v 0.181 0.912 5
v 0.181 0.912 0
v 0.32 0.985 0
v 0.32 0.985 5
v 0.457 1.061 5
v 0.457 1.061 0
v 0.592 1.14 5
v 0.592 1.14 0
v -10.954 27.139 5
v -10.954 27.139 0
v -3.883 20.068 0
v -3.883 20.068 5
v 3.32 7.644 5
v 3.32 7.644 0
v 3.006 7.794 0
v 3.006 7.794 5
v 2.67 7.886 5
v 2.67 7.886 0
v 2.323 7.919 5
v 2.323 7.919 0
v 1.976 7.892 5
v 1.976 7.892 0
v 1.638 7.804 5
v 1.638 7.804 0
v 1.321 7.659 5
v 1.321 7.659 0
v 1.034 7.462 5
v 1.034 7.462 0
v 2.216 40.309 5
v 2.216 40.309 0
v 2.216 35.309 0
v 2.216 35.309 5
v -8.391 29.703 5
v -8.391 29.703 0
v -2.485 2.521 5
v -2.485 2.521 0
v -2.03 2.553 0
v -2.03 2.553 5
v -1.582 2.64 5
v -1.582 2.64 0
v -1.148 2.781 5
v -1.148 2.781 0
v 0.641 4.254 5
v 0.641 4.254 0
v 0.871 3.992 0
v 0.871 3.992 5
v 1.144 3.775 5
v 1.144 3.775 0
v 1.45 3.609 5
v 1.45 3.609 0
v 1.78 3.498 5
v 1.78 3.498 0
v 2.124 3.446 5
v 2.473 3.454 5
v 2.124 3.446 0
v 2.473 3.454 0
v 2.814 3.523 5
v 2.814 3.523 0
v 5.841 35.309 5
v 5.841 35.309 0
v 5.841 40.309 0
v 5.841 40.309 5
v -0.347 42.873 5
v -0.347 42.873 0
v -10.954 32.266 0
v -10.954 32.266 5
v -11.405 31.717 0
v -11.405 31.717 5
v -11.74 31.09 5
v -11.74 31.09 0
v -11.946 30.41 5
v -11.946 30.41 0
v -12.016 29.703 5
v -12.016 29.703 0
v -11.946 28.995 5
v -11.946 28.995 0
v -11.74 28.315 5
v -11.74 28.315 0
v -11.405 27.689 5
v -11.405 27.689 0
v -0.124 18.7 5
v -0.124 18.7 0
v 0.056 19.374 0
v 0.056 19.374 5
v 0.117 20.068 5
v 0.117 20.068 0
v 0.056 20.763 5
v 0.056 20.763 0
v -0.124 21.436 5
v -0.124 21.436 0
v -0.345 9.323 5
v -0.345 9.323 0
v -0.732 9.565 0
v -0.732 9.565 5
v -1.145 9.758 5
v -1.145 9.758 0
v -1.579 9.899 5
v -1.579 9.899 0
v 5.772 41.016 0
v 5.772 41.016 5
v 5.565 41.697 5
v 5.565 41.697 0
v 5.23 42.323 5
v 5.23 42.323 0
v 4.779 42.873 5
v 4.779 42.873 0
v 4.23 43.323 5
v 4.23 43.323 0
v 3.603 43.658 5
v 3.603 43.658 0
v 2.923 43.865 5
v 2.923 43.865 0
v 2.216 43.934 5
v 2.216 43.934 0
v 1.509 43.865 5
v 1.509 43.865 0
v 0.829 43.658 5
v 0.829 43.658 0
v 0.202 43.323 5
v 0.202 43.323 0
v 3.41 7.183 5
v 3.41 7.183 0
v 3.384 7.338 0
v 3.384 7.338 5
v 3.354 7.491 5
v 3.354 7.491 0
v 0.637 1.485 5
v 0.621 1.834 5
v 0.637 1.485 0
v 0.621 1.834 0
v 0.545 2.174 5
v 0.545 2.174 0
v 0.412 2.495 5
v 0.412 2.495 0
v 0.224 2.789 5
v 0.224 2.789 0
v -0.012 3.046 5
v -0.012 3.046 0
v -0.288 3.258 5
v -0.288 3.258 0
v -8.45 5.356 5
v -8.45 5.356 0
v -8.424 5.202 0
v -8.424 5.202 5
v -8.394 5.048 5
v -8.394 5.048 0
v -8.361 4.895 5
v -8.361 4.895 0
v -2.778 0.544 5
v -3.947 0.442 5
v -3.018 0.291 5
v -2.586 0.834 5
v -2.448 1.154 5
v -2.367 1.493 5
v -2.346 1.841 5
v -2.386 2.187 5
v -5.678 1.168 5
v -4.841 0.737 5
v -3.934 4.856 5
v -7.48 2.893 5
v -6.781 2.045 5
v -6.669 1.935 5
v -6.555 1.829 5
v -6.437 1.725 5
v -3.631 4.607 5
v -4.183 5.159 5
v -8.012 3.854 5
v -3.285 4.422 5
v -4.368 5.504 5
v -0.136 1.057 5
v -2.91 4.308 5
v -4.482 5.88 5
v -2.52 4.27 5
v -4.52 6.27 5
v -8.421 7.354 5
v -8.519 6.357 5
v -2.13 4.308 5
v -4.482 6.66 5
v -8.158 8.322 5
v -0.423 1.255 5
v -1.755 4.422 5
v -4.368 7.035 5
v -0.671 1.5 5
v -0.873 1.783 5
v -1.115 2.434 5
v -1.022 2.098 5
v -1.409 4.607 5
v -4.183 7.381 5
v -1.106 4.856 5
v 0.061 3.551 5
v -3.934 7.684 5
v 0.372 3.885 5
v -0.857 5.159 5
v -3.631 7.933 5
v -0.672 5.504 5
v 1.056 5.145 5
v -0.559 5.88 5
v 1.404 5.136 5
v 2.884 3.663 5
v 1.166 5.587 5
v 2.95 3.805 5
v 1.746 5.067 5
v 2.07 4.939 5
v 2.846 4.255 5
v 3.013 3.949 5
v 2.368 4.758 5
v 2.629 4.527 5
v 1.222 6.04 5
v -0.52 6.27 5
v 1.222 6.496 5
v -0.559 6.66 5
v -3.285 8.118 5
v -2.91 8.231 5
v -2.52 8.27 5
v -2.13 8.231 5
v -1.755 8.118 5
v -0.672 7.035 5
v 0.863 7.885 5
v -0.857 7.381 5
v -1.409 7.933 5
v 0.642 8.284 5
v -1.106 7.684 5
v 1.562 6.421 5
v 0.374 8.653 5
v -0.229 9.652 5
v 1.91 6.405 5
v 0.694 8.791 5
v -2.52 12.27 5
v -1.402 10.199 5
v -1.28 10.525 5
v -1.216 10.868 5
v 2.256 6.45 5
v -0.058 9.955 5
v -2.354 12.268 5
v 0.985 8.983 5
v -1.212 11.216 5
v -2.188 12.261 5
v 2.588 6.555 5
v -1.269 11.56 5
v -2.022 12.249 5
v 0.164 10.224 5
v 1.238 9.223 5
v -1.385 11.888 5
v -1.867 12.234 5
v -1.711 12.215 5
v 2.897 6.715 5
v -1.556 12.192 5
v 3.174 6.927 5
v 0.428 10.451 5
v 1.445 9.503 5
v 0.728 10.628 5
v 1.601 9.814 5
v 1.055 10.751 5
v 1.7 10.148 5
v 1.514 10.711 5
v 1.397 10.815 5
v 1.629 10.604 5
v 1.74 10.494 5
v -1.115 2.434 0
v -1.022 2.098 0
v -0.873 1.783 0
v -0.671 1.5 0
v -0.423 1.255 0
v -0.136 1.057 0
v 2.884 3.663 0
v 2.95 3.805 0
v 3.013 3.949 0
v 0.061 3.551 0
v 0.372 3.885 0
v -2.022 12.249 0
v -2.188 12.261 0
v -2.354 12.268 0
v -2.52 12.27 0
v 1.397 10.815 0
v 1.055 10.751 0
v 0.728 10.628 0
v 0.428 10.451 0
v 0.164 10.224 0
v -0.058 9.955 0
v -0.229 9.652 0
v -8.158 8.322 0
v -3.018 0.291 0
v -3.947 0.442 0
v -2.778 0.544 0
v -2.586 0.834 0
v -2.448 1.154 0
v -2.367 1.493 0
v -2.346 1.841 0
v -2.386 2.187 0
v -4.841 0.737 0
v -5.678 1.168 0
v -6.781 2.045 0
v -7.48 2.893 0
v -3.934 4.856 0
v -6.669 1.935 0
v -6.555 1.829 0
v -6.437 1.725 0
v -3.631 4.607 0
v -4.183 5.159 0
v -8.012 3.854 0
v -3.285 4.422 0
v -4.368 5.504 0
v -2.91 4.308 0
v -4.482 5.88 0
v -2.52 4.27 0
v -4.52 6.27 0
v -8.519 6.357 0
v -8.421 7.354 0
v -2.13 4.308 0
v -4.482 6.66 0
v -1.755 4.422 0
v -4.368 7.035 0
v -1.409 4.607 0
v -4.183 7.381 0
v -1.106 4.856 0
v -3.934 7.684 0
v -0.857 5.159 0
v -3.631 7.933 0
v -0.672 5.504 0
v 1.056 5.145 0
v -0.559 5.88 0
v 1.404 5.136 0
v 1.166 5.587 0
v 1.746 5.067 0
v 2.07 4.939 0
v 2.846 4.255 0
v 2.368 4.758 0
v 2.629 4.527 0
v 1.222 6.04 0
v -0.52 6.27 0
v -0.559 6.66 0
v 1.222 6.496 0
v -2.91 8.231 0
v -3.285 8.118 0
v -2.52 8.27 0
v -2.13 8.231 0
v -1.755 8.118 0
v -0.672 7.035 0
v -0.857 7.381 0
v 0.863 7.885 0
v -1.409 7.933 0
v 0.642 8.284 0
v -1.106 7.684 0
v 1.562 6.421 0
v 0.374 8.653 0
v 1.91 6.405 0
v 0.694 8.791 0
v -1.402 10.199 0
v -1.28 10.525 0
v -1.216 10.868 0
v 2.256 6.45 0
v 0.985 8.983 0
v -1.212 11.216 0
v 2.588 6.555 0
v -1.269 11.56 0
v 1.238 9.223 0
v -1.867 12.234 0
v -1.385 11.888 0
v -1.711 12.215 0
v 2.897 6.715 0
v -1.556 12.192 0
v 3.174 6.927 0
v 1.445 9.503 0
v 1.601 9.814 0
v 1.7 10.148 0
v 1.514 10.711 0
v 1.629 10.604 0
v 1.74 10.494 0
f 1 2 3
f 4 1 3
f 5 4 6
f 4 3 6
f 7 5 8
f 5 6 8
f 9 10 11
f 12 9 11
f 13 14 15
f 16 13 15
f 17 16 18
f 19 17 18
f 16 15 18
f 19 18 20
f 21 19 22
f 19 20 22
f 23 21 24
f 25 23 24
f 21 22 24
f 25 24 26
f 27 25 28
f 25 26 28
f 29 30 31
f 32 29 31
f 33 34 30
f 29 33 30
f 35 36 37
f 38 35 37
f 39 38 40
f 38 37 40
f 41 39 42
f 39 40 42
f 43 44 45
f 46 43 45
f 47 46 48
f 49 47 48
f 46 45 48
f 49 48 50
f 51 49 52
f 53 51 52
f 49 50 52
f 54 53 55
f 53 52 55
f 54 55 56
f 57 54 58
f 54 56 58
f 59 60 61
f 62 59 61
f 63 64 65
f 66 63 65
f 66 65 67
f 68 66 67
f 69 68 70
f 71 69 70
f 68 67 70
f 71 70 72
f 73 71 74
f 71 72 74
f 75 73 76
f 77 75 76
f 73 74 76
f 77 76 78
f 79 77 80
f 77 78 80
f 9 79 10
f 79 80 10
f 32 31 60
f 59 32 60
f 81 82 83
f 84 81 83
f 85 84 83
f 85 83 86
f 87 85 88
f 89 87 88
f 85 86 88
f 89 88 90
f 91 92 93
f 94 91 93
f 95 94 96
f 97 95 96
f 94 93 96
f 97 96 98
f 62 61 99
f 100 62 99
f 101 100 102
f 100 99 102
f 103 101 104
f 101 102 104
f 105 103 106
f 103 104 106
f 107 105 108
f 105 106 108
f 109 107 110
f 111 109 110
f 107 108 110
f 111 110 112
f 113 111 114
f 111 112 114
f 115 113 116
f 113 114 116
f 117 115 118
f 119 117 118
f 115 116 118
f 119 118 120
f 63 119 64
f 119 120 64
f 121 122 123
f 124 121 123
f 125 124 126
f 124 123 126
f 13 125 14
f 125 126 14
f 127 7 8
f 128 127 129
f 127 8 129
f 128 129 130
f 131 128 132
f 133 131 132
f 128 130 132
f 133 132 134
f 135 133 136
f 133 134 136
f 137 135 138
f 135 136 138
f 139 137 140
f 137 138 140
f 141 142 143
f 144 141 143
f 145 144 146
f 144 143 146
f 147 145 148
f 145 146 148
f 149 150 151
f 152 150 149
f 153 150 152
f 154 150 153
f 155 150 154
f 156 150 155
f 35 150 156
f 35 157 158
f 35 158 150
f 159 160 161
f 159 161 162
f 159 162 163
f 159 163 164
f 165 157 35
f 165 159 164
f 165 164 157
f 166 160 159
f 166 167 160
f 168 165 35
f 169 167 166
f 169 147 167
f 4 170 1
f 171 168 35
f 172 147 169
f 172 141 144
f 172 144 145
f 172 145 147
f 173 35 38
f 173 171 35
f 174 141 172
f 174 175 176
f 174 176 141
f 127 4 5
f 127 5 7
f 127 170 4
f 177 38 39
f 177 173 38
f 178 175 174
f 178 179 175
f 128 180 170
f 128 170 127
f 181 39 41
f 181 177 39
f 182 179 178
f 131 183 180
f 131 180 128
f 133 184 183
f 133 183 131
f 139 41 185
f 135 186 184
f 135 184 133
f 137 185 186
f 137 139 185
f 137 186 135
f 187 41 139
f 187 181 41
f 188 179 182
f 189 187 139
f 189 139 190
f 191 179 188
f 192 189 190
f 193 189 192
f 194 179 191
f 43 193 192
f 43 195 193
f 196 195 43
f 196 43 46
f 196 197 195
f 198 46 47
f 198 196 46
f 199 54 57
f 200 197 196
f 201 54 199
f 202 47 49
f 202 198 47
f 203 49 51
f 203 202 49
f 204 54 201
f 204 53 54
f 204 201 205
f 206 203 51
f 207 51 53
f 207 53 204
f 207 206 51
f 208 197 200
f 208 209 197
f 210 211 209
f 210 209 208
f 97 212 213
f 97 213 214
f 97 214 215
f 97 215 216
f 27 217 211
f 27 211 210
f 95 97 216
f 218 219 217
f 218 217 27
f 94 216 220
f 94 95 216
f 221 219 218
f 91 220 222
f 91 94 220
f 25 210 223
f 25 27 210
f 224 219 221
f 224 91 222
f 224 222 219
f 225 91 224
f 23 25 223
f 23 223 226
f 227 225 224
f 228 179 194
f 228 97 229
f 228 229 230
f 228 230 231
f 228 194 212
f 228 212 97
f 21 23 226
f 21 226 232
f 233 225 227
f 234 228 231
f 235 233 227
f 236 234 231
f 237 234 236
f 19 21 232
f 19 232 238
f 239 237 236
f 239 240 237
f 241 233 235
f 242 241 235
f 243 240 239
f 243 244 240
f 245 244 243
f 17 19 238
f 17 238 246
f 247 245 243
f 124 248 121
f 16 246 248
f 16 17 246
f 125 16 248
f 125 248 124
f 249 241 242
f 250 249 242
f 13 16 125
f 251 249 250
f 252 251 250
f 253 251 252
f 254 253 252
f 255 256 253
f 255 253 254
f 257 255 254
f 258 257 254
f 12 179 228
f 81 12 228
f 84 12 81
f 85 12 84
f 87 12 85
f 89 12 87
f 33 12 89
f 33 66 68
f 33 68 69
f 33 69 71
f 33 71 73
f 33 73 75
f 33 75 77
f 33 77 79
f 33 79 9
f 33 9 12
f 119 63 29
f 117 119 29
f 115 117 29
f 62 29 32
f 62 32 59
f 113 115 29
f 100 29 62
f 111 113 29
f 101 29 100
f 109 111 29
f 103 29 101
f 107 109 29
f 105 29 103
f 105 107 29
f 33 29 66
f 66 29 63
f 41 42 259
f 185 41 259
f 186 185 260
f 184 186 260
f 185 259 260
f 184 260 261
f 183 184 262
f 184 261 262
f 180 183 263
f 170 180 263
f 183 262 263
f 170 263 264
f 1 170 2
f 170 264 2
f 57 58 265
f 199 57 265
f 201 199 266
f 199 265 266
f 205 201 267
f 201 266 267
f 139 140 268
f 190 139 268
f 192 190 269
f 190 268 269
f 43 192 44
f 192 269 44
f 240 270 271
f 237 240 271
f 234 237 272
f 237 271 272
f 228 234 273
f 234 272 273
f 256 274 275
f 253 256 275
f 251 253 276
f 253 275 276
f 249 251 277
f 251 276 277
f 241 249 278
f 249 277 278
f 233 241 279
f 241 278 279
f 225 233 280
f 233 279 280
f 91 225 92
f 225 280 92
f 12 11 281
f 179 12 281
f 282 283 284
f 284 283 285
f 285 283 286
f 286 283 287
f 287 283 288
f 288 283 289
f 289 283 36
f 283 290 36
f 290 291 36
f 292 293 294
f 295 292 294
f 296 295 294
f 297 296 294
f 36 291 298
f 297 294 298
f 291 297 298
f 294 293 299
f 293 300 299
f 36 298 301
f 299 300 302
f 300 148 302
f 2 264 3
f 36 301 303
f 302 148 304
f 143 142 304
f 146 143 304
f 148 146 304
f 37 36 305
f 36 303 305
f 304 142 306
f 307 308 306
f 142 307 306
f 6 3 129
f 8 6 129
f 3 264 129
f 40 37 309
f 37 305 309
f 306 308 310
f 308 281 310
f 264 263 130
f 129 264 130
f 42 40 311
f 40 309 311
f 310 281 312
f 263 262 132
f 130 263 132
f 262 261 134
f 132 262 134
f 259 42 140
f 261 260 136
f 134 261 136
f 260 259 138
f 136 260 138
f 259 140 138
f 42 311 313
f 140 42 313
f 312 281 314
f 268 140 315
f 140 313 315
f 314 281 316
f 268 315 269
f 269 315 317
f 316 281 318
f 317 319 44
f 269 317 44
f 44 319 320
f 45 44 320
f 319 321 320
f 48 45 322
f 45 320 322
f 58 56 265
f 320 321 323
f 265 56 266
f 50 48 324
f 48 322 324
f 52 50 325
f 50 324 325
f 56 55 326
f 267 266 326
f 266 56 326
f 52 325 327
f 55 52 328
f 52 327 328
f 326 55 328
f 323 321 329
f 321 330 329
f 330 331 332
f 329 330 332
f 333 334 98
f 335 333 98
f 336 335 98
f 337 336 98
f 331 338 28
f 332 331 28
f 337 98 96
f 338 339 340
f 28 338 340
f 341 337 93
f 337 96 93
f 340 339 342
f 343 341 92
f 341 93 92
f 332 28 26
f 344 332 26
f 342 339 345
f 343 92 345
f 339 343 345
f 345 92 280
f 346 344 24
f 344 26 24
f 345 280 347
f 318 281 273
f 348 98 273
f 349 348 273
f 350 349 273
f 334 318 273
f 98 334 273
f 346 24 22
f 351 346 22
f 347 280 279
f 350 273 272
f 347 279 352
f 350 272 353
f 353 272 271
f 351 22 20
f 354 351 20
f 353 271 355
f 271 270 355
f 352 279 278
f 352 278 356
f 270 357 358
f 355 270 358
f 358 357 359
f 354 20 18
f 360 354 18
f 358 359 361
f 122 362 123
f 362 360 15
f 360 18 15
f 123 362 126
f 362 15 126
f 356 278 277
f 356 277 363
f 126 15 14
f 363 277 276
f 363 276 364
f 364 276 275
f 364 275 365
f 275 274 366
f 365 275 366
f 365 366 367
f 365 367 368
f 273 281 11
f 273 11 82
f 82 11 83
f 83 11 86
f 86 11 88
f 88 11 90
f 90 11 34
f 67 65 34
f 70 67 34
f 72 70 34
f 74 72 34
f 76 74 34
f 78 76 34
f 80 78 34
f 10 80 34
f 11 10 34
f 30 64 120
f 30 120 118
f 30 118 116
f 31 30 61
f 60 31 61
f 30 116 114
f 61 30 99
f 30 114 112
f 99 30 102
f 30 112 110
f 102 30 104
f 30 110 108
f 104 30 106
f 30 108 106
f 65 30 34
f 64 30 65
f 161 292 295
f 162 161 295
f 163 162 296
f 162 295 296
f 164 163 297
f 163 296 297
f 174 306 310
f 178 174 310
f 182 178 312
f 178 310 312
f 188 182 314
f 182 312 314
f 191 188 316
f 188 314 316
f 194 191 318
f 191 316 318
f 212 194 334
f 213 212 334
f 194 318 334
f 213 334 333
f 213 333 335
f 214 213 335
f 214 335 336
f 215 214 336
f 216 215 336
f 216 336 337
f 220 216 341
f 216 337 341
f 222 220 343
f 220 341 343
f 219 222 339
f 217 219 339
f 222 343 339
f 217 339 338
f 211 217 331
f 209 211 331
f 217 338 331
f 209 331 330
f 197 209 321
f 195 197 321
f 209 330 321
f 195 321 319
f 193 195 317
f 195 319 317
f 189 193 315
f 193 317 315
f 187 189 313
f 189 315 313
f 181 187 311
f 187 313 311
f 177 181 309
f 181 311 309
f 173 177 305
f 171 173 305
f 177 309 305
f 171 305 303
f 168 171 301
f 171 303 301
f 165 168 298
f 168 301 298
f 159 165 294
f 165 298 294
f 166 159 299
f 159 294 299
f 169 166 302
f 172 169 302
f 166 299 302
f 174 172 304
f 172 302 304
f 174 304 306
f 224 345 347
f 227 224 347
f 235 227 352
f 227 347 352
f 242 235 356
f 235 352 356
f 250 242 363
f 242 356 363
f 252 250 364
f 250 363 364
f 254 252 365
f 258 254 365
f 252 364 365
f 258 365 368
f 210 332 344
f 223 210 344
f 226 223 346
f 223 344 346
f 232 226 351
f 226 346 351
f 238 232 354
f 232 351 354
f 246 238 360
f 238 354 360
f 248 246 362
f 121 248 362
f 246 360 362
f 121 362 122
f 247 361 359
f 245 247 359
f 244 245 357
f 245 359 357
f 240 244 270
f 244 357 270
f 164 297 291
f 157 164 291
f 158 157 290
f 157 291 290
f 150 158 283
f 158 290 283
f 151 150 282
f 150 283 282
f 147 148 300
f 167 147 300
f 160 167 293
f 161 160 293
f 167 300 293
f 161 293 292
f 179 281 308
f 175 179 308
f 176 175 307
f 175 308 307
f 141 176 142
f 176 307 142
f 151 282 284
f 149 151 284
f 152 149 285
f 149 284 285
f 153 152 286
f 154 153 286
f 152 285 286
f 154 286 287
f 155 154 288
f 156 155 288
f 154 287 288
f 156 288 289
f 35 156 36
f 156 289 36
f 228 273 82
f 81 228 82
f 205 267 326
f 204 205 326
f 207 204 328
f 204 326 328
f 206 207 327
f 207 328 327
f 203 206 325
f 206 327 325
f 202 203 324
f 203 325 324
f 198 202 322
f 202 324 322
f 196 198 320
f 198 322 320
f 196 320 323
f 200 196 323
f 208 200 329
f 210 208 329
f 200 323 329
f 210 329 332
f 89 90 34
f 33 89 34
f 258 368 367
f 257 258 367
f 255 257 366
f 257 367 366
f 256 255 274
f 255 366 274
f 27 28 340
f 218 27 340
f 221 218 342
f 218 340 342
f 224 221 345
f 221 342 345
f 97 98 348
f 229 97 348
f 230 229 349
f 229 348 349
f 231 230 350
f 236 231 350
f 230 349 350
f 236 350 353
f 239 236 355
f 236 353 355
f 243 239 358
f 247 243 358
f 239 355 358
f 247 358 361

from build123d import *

# Parameters (mm, degrees)
BOSS_EXTRUDE1_DEPTH = 5
CUT_EXTRUDE1_REACH  = 47.822
SKETCH1_4_R         = 2
CUT_EXTRUDE2_DEPTH  = 5
BOSS_EXTRUDE2_DEPTH = 5
SKETCH6_R           = 2
CUT_EXTRUDE3_DEPTH  = 5


with BuildPart() as part:
    # Sketch1 → Boss-Extrude1 (new body)
    with BuildSketch(Plane.XY):
        with BuildLine():
            Line((-2.520114714, 12.269831909), (-0.124248164, 18.700029955))
            ThreePointArc((-0.124248164, 18.700029955), (0.116981353, 20.068110528), (-0.124248164, 21.436191102))
            Line((-0.124248164, 21.436191102), (-8.39066093, 29.702603869))
            Line((-8.39066093, 29.702603869), (2.215940787, 40.309205586))
            Line((2.215940787, 40.309205586), (2.215940787, 35.309205586))
            Line((2.215940787, 35.309205586), (5.841171936, 35.309205586))
            Line((5.841171936, 35.309205586), (5.841171936, 40.309205586))
            ThreePointArc((5.841171936, 40.309205586), (3.603256686, 43.658482445), (-0.347484741, 42.872631115))
            Line((-0.347484741, 42.872631115), (-10.954086459, 32.266029397))
            ThreePointArc((-10.954086459, 32.266029397), (-12.015892078, 29.702603869), (-10.954086459, 27.13917834))
            Line((-10.954086459, 27.13917834), (-3.883018647, 20.068110528))
            Line((-3.883018647, 20.068110528), (-8.158270438, 8.321952769))
            ThreePointArc((-8.158270438, 8.321952769), (0.921343905, 1.354919643), (-2.520114714, 12.269831909))
        make_face()
    extrude(amount=BOSS_EXTRUDE1_DEPTH)

    # Sketch1<4> → Cut-Extrude1 (cut, up to next)
    with BuildSketch(Plane.XY, mode=Mode.PRIVATE) as cut_extrude1_sk1:
        with Locations((-2.520114714, 6.269831909)):
            Circle(SKETCH1_4_R)
    cut_extrude1_tool1 = extrude(cut_extrude1_sk1.sketch, amount=CUT_EXTRUDE1_REACH, mode=Mode.PRIVATE) & part.part
    add(cut_extrude1_tool1.solids().sort_by_distance((-2.520115, 6.269832, 0))[0], mode=Mode.SUBTRACT)

    # Sketch5 → Cut-Extrude2 (cut)
    with BuildSketch(Plane(origin=(0, 0, 0), x_dir=(-1, 0, 0), z_dir=(0, 0, -1))):
        with BuildLine():
            Line((2.022476226, 12.24915929), (2.209173599, 10.005914968))
            ThreePointArc((2.209173599, 10.005914968), (-1.215968345, 5.958890794), (2.831055828, 2.53374885))
            Line((2.831055828, 2.53374885), (3.017753201, 0.290504527))
            ThreePointArc((3.017753201, 0.290504527), (-3.459212668, 5.772193421), (2.022476226, 12.24915929))
        make_face()
    extrude(amount=-CUT_EXTRUDE2_DEPTH, mode=Mode.SUBTRACT)

    # Sketch3 → Boss-Extrude2 (add)
    with BuildSketch(Plane.XY):
        with BuildLine():
            ThreePointArc((3.320342305, 7.644263358), (2.148599503, 7.913084677), (1.034423028, 7.461579551))
            ThreePointArc((1.034423028, 7.461579551), (0.758834569, 8.087383175), (0.37416263, 8.65272084))
            ThreePointArc((0.37416263, 8.65272084), (1.347484271, 9.358334814), (1.740439947, 10.494482662))
            ThreePointArc((1.740439947, 10.494482662), (1.571875447, 10.657954118), (1.397043733, 10.814704811))
            ThreePointArc((1.397043733, 10.814704811), (0.291074687, 10.343452688), (-0.344924962, 9.323280867))
            ThreePointArc((-0.344924962, 9.323280867), (-0.93571885, 9.667579802), (-1.579222127, 9.898843088))
            ThreePointArc((-1.579222127, 9.898843088), (-1.206537867, 11.041800891), (-1.556440997, 12.191937359))
            ThreePointArc((-1.556440997, 12.191937359), (-1.788898653, 12.225108819), (-2.022476226, 12.24915929))
            ThreePointArc((-2.022476226, 12.24915929), (-2.640228932, 11.217836019), (-2.555121505, 10.018668465))
            ThreePointArc((-2.555121505, 10.018668465), (-3.235457637, 9.949952219), (-3.891995873, 9.758806412))
            ThreePointArc((-3.891995873, 9.758806412), (-4.262301713, 10.90253701), (-5.221412546, 11.627349059))
            ThreePointArc((-5.221412546, 11.627349059), (-5.428972435, 11.517550152), (-5.632077174, 11.399713939))
            ThreePointArc((-5.632077174, 11.399713939), (-5.525653002, 10.202249956), (-4.751946644, 9.282127916))
            ThreePointArc((-4.751946644, 9.282127916), (-5.261959741, 8.826643761), (-5.680757645, 8.286100061))
            ThreePointArc((-5.680757645, 8.286100061), (-6.65260934, 8.99373724), (-7.854580137, 9.016371303))
            ThreePointArc((-7.854580137, 9.016371303), (-7.957961436, 8.805541479), (-8.053014233, 8.590828011))
            ThreePointArc((-8.053014233, 8.590828011), (-7.2630636, 7.684613857), (-6.096287842, 7.394992676))
            ThreePointArc((-6.096287842, 7.394992676), (-6.241170236, 6.726720077), (-6.262261243, 6.043247807))
            ThreePointArc((-6.262261243, 6.043247807), (-7.464444479, 6.044498216), (-8.450163248, 5.35630885))
            ThreePointArc((-8.450163248, 5.35630885), (-8.409877814, 5.124977936), (-8.360571733, 4.895400459))
            ThreePointArc((-8.360571733, 4.895400459), (-7.18882893, 4.62657914), (-6.074652455, 5.078084267))
            ThreePointArc((-6.074652455, 5.078084267), (-5.799063996, 4.452280642), (-5.414392057, 3.886942978))
            ThreePointArc((-5.414392057, 3.886942978), (-6.387713698, 3.181329004), (-6.780669374, 2.045181156))
            ThreePointArc((-6.780669374, 2.045181156), (-6.612104874, 1.881709699), (-6.43727316, 1.724959006))
            ThreePointArc((-6.43727316, 1.724959006), (-5.331304114, 2.196211129), (-4.695304465, 3.21638295))
            ThreePointArc((-4.695304465, 3.21638295), (-4.104510577, 2.872084015), (-3.4610073, 2.640820729))
            ThreePointArc((-3.4610073, 2.640820729), (-3.83369156, 1.497862927), (-3.48378843, 0.347726458))
            ThreePointArc((-3.48378843, 0.347726458), (-3.251330774, 0.314554999), (-3.017753201, 0.290504527))
            ThreePointArc((-3.017753201, 0.290504527), (-2.400000495, 1.321827799), (-2.485107922, 2.520995353))
            ThreePointArc((-2.485107922, 2.520995353), (-1.80477179, 2.589711598), (-1.148233554, 2.780857406))
            ThreePointArc((-1.148233554, 2.780857406), (-0.777927714, 1.637126807), (0.181183119, 0.912314758))
            ThreePointArc((0.181183119, 0.912314758), (0.388743008, 1.022113666), (0.591847747, 1.139949878))
            ThreePointArc((0.591847747, 1.139949878), (0.485423575, 2.337413862), (-0.288282783, 3.257535901))
            ThreePointArc((-0.288282783, 3.257535901), (0.221730314, 3.713020057), (0.640528217, 4.253563756))
            ThreePointArc((0.640528217, 4.253563756), (1.612379913, 3.545926577), (2.81435071, 3.523292514))
            ThreePointArc((2.81435071, 3.523292514), (2.917732009, 3.734122338), (3.012784806, 3.948835807))
            ThreePointArc((3.012784806, 3.948835807), (2.222834173, 4.855049961), (1.056058415, 5.144671141))
            ThreePointArc((1.056058415, 5.144671141), (1.200940809, 5.81294374), (1.222031815, 6.496416011))
            ThreePointArc((1.222031815, 6.496416011), (2.424215051, 6.495165601), (3.409933821, 7.183354967))
            ThreePointArc((3.409933821, 7.183354967), (3.369648387, 7.414685881), (3.320342305, 7.644263358))
        make_face()
    extrude(amount=BOSS_EXTRUDE2_DEPTH)

    # Sketch6 → Cut-Extrude3 (cut)
    with BuildSketch(Plane(origin=(0, 0, 0), x_dir=(-1, 0, 0), z_dir=(0, 0, -1))):
        with Locations((2.520114714, 6.269831909)):
            Circle(SKETCH6_R)
    extrude(amount=-CUT_EXTRUDE3_DEPTH, mode=Mode.SUBTRACT)


solid = part.part
